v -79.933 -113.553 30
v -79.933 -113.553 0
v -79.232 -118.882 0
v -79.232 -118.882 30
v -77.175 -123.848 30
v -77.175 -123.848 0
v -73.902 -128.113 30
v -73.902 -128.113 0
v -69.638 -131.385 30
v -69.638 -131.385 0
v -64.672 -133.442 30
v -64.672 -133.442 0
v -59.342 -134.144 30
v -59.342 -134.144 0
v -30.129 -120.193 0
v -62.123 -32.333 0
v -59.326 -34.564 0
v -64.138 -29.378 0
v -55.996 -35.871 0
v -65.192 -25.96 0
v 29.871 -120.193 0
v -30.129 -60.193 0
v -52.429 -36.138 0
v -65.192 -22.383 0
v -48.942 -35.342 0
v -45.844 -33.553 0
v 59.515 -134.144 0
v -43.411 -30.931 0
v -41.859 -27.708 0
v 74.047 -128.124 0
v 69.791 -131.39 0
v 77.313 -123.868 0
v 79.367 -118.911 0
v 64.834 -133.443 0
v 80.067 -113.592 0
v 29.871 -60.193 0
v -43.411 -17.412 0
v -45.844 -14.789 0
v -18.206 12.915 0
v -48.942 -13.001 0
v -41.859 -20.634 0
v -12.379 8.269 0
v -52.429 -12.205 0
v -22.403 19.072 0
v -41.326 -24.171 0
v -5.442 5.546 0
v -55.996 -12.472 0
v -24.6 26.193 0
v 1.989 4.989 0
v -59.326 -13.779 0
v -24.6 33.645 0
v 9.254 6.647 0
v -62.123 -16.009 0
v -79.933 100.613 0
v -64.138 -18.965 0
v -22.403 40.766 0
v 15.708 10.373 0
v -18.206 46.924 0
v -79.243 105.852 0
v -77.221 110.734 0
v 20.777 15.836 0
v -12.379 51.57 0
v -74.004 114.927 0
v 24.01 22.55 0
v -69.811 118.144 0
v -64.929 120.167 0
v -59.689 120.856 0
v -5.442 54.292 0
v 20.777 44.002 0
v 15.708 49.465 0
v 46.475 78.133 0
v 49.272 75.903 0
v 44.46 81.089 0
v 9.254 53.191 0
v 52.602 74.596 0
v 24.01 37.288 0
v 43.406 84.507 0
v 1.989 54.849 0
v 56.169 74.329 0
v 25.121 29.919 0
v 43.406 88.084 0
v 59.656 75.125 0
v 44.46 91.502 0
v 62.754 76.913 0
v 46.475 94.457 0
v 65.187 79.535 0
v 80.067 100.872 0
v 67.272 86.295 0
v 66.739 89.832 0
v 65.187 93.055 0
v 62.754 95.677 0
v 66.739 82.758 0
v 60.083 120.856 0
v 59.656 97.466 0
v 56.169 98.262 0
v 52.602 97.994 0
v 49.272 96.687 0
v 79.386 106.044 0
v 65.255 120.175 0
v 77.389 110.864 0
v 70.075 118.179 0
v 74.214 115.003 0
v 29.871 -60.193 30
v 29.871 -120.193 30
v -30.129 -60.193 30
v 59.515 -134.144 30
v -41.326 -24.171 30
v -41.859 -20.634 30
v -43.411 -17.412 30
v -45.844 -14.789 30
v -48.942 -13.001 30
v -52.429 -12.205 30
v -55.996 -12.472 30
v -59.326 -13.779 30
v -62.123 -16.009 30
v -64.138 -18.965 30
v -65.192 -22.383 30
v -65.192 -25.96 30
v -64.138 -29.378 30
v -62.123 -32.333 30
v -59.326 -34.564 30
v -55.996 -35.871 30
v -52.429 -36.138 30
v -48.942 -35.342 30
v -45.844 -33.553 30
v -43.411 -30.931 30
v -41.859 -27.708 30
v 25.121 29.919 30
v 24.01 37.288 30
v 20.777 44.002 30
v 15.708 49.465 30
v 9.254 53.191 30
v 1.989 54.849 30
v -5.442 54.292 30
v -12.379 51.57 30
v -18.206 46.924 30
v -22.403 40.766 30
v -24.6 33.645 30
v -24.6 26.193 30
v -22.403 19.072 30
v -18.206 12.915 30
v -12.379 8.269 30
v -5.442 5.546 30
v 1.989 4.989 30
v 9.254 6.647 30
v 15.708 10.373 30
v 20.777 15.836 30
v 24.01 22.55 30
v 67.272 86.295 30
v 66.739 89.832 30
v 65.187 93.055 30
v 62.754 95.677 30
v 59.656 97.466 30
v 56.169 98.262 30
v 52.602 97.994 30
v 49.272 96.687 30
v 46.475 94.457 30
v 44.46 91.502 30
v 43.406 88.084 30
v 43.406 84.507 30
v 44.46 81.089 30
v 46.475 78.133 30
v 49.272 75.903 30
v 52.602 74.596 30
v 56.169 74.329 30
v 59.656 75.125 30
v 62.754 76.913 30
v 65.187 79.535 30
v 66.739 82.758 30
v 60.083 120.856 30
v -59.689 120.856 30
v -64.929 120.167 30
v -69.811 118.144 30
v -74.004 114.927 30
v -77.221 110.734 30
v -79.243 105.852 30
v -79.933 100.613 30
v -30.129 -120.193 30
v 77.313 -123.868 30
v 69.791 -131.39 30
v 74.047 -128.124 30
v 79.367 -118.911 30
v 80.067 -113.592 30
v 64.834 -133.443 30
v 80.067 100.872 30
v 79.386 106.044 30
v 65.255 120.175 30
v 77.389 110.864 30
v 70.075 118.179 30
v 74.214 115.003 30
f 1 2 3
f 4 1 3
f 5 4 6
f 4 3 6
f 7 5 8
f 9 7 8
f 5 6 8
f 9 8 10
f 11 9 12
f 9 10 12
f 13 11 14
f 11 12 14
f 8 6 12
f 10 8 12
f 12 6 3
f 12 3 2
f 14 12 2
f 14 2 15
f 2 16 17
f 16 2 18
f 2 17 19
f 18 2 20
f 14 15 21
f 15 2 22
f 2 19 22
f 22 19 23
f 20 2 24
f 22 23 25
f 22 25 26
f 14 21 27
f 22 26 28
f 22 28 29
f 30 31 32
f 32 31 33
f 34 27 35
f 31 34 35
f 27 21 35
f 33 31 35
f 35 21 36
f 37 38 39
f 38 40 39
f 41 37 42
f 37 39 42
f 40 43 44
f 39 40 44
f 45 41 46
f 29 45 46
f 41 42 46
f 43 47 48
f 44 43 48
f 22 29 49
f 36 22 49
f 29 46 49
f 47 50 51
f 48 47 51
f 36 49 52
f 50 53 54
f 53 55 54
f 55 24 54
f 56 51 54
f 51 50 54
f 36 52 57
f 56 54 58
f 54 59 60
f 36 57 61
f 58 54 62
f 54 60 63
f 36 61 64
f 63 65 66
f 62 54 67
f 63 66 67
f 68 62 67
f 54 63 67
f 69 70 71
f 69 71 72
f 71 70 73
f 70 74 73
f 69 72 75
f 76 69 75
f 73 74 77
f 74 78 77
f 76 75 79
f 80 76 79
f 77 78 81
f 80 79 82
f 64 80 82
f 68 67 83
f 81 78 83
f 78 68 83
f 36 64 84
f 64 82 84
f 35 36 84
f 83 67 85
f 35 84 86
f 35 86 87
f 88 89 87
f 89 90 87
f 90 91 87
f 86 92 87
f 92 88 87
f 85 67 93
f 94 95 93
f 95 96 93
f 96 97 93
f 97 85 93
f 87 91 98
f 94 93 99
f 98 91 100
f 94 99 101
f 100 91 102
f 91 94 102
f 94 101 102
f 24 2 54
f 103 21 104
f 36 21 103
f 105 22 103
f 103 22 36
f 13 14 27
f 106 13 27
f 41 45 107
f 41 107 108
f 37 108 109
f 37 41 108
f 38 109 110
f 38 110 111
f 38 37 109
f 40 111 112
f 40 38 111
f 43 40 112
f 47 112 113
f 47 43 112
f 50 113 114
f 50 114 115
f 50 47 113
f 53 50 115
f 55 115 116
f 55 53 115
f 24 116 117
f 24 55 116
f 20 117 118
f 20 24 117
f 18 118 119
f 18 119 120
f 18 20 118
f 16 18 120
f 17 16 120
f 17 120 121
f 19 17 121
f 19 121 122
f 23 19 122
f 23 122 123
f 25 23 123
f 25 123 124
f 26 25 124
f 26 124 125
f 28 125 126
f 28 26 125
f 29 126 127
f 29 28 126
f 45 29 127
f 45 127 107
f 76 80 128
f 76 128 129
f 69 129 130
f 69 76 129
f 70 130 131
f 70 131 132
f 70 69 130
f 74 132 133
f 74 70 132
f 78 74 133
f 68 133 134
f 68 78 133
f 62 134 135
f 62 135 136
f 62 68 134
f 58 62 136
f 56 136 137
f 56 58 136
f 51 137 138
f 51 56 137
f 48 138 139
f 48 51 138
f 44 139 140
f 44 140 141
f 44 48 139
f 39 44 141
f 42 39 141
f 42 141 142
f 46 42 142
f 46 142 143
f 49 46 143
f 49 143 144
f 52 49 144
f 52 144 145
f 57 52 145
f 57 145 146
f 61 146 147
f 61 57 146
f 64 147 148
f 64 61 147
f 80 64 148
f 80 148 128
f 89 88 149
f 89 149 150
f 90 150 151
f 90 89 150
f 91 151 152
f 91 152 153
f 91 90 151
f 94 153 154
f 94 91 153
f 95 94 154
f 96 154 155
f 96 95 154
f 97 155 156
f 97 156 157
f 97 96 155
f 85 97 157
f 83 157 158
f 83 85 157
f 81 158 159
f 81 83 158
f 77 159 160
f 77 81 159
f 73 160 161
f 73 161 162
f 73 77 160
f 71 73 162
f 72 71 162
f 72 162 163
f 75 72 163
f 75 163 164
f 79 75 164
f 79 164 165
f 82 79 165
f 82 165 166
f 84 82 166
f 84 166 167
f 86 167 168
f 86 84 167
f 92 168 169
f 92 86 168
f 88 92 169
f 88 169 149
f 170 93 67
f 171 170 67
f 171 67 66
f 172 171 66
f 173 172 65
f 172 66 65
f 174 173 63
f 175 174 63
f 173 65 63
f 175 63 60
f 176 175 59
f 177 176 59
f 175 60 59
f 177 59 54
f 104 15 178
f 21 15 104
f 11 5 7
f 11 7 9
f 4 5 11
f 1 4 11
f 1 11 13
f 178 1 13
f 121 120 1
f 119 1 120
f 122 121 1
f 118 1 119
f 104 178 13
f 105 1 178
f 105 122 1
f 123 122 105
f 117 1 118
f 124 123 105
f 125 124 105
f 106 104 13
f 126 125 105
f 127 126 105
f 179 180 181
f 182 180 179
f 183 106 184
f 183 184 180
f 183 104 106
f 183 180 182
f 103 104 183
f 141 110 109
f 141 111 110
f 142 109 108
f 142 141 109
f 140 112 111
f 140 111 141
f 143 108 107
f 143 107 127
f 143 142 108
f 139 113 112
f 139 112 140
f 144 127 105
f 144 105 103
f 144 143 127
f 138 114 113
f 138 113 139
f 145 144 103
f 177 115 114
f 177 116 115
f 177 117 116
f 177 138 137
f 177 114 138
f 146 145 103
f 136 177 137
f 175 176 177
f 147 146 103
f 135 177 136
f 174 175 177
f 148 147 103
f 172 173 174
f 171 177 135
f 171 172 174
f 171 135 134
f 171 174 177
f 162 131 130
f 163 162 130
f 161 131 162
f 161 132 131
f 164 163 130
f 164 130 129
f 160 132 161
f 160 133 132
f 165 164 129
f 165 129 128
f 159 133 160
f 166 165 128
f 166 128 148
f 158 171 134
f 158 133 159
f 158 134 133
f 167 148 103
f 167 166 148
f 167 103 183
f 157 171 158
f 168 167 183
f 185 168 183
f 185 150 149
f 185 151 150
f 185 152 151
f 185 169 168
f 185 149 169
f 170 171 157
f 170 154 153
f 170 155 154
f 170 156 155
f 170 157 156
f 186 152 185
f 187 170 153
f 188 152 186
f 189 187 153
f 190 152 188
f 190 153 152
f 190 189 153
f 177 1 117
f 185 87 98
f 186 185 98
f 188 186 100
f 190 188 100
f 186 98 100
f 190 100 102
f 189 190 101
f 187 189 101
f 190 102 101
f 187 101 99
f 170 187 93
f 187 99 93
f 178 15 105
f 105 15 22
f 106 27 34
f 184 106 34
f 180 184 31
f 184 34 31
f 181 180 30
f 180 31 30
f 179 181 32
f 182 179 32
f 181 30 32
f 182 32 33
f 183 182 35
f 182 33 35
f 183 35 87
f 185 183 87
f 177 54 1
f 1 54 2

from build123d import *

# Parameters (mm, degrees)
SKETCH_R     = 25
SKETCH_R_2   = 12
SKETCH_W     = 60
SKETCH_H     = 60
PAD_DEPTH    = 30
PAD001_DEPTH = 30


with BuildPart() as part:
    # Sketch → Pad (new body)
    with BuildSketch(Plane.XY):
        with BuildLine():
            Line((-59.342312, -134.143673), (59.515305, -134.143673))
            ThreePointArc((59.515305, -134.143673), (74.047401, -128.124281), (80.066793, -113.592185))
            Line((80.066793, -113.592185), (80.066793, 100.872214))
            ThreePointArc((80.066793, 100.872214), (74.213582, 115.003116), (60.08268, 120.856327))
            Line((60.08268, 120.856327), (-59.689381, 120.856327))
            ThreePointArc((-59.689381, 120.856327), (-74.003928, 114.927048), (-79.933207, 100.612501))
            Line((-79.933207, 100.612501), (-79.933207, -113.552778))
            ThreePointArc((-79.933207, -113.552778), (-73.902274, -128.112739), (-59.342312, -134.143673))
        make_face()
        with Locations((0.120778, 29.919195)):
            Circle(SKETCH_R, mode=Mode.SUBTRACT)
        with Locations((-53.325886, -24.171413)):
            Circle(SKETCH_R_2, mode=Mode.SUBTRACT)
        with Locations((55.271923, 86.295181)):
            Circle(SKETCH_R_2, mode=Mode.SUBTRACT)
        with Locations((-0.129082, -90.192567)):
            Rectangle(SKETCH_W, SKETCH_H, mode=Mode.SUBTRACT)
    extrude(amount=PAD_DEPTH)

    # Sketch → Pad001 (join)
    with BuildSketch(Plane.XY):
        with BuildLine():
            Line((-59.342312, -134.143673), (59.515305, -134.143673))
            ThreePointArc((59.515305, -134.143673), (74.047401, -128.124281), (80.066793, -113.592185))
            Line((80.066793, -113.592185), (80.066793, 100.872214))
            ThreePointArc((80.066793, 100.872214), (74.213582, 115.003116), (60.08268, 120.856327))
            Line((60.08268, 120.856327), (-59.689381, 120.856327))
            ThreePointArc((-59.689381, 120.856327), (-74.003928, 114.927048), (-79.933207, 100.612501))
            Line((-79.933207, 100.612501), (-79.933207, -113.552778))
            ThreePointArc((-79.933207, -113.552778), (-73.902274, -128.112739), (-59.342312, -134.143673))
        make_face()
        with Locations((0.120778, 29.919195)):
            Circle(SKETCH_R, mode=Mode.SUBTRACT)
        with Locations((-53.325886, -24.171413)):
            Circle(SKETCH_R_2, mode=Mode.SUBTRACT)
        with Locations((55.271923, 86.295181)):
            Circle(SKETCH_R_2, mode=Mode.SUBTRACT)
        with Locations((-0.129082, -90.192567)):
            Rectangle(SKETCH_W, SKETCH_H, mode=Mode.SUBTRACT)
    extrude(amount=PAD001_DEPTH)


solid = part.part
